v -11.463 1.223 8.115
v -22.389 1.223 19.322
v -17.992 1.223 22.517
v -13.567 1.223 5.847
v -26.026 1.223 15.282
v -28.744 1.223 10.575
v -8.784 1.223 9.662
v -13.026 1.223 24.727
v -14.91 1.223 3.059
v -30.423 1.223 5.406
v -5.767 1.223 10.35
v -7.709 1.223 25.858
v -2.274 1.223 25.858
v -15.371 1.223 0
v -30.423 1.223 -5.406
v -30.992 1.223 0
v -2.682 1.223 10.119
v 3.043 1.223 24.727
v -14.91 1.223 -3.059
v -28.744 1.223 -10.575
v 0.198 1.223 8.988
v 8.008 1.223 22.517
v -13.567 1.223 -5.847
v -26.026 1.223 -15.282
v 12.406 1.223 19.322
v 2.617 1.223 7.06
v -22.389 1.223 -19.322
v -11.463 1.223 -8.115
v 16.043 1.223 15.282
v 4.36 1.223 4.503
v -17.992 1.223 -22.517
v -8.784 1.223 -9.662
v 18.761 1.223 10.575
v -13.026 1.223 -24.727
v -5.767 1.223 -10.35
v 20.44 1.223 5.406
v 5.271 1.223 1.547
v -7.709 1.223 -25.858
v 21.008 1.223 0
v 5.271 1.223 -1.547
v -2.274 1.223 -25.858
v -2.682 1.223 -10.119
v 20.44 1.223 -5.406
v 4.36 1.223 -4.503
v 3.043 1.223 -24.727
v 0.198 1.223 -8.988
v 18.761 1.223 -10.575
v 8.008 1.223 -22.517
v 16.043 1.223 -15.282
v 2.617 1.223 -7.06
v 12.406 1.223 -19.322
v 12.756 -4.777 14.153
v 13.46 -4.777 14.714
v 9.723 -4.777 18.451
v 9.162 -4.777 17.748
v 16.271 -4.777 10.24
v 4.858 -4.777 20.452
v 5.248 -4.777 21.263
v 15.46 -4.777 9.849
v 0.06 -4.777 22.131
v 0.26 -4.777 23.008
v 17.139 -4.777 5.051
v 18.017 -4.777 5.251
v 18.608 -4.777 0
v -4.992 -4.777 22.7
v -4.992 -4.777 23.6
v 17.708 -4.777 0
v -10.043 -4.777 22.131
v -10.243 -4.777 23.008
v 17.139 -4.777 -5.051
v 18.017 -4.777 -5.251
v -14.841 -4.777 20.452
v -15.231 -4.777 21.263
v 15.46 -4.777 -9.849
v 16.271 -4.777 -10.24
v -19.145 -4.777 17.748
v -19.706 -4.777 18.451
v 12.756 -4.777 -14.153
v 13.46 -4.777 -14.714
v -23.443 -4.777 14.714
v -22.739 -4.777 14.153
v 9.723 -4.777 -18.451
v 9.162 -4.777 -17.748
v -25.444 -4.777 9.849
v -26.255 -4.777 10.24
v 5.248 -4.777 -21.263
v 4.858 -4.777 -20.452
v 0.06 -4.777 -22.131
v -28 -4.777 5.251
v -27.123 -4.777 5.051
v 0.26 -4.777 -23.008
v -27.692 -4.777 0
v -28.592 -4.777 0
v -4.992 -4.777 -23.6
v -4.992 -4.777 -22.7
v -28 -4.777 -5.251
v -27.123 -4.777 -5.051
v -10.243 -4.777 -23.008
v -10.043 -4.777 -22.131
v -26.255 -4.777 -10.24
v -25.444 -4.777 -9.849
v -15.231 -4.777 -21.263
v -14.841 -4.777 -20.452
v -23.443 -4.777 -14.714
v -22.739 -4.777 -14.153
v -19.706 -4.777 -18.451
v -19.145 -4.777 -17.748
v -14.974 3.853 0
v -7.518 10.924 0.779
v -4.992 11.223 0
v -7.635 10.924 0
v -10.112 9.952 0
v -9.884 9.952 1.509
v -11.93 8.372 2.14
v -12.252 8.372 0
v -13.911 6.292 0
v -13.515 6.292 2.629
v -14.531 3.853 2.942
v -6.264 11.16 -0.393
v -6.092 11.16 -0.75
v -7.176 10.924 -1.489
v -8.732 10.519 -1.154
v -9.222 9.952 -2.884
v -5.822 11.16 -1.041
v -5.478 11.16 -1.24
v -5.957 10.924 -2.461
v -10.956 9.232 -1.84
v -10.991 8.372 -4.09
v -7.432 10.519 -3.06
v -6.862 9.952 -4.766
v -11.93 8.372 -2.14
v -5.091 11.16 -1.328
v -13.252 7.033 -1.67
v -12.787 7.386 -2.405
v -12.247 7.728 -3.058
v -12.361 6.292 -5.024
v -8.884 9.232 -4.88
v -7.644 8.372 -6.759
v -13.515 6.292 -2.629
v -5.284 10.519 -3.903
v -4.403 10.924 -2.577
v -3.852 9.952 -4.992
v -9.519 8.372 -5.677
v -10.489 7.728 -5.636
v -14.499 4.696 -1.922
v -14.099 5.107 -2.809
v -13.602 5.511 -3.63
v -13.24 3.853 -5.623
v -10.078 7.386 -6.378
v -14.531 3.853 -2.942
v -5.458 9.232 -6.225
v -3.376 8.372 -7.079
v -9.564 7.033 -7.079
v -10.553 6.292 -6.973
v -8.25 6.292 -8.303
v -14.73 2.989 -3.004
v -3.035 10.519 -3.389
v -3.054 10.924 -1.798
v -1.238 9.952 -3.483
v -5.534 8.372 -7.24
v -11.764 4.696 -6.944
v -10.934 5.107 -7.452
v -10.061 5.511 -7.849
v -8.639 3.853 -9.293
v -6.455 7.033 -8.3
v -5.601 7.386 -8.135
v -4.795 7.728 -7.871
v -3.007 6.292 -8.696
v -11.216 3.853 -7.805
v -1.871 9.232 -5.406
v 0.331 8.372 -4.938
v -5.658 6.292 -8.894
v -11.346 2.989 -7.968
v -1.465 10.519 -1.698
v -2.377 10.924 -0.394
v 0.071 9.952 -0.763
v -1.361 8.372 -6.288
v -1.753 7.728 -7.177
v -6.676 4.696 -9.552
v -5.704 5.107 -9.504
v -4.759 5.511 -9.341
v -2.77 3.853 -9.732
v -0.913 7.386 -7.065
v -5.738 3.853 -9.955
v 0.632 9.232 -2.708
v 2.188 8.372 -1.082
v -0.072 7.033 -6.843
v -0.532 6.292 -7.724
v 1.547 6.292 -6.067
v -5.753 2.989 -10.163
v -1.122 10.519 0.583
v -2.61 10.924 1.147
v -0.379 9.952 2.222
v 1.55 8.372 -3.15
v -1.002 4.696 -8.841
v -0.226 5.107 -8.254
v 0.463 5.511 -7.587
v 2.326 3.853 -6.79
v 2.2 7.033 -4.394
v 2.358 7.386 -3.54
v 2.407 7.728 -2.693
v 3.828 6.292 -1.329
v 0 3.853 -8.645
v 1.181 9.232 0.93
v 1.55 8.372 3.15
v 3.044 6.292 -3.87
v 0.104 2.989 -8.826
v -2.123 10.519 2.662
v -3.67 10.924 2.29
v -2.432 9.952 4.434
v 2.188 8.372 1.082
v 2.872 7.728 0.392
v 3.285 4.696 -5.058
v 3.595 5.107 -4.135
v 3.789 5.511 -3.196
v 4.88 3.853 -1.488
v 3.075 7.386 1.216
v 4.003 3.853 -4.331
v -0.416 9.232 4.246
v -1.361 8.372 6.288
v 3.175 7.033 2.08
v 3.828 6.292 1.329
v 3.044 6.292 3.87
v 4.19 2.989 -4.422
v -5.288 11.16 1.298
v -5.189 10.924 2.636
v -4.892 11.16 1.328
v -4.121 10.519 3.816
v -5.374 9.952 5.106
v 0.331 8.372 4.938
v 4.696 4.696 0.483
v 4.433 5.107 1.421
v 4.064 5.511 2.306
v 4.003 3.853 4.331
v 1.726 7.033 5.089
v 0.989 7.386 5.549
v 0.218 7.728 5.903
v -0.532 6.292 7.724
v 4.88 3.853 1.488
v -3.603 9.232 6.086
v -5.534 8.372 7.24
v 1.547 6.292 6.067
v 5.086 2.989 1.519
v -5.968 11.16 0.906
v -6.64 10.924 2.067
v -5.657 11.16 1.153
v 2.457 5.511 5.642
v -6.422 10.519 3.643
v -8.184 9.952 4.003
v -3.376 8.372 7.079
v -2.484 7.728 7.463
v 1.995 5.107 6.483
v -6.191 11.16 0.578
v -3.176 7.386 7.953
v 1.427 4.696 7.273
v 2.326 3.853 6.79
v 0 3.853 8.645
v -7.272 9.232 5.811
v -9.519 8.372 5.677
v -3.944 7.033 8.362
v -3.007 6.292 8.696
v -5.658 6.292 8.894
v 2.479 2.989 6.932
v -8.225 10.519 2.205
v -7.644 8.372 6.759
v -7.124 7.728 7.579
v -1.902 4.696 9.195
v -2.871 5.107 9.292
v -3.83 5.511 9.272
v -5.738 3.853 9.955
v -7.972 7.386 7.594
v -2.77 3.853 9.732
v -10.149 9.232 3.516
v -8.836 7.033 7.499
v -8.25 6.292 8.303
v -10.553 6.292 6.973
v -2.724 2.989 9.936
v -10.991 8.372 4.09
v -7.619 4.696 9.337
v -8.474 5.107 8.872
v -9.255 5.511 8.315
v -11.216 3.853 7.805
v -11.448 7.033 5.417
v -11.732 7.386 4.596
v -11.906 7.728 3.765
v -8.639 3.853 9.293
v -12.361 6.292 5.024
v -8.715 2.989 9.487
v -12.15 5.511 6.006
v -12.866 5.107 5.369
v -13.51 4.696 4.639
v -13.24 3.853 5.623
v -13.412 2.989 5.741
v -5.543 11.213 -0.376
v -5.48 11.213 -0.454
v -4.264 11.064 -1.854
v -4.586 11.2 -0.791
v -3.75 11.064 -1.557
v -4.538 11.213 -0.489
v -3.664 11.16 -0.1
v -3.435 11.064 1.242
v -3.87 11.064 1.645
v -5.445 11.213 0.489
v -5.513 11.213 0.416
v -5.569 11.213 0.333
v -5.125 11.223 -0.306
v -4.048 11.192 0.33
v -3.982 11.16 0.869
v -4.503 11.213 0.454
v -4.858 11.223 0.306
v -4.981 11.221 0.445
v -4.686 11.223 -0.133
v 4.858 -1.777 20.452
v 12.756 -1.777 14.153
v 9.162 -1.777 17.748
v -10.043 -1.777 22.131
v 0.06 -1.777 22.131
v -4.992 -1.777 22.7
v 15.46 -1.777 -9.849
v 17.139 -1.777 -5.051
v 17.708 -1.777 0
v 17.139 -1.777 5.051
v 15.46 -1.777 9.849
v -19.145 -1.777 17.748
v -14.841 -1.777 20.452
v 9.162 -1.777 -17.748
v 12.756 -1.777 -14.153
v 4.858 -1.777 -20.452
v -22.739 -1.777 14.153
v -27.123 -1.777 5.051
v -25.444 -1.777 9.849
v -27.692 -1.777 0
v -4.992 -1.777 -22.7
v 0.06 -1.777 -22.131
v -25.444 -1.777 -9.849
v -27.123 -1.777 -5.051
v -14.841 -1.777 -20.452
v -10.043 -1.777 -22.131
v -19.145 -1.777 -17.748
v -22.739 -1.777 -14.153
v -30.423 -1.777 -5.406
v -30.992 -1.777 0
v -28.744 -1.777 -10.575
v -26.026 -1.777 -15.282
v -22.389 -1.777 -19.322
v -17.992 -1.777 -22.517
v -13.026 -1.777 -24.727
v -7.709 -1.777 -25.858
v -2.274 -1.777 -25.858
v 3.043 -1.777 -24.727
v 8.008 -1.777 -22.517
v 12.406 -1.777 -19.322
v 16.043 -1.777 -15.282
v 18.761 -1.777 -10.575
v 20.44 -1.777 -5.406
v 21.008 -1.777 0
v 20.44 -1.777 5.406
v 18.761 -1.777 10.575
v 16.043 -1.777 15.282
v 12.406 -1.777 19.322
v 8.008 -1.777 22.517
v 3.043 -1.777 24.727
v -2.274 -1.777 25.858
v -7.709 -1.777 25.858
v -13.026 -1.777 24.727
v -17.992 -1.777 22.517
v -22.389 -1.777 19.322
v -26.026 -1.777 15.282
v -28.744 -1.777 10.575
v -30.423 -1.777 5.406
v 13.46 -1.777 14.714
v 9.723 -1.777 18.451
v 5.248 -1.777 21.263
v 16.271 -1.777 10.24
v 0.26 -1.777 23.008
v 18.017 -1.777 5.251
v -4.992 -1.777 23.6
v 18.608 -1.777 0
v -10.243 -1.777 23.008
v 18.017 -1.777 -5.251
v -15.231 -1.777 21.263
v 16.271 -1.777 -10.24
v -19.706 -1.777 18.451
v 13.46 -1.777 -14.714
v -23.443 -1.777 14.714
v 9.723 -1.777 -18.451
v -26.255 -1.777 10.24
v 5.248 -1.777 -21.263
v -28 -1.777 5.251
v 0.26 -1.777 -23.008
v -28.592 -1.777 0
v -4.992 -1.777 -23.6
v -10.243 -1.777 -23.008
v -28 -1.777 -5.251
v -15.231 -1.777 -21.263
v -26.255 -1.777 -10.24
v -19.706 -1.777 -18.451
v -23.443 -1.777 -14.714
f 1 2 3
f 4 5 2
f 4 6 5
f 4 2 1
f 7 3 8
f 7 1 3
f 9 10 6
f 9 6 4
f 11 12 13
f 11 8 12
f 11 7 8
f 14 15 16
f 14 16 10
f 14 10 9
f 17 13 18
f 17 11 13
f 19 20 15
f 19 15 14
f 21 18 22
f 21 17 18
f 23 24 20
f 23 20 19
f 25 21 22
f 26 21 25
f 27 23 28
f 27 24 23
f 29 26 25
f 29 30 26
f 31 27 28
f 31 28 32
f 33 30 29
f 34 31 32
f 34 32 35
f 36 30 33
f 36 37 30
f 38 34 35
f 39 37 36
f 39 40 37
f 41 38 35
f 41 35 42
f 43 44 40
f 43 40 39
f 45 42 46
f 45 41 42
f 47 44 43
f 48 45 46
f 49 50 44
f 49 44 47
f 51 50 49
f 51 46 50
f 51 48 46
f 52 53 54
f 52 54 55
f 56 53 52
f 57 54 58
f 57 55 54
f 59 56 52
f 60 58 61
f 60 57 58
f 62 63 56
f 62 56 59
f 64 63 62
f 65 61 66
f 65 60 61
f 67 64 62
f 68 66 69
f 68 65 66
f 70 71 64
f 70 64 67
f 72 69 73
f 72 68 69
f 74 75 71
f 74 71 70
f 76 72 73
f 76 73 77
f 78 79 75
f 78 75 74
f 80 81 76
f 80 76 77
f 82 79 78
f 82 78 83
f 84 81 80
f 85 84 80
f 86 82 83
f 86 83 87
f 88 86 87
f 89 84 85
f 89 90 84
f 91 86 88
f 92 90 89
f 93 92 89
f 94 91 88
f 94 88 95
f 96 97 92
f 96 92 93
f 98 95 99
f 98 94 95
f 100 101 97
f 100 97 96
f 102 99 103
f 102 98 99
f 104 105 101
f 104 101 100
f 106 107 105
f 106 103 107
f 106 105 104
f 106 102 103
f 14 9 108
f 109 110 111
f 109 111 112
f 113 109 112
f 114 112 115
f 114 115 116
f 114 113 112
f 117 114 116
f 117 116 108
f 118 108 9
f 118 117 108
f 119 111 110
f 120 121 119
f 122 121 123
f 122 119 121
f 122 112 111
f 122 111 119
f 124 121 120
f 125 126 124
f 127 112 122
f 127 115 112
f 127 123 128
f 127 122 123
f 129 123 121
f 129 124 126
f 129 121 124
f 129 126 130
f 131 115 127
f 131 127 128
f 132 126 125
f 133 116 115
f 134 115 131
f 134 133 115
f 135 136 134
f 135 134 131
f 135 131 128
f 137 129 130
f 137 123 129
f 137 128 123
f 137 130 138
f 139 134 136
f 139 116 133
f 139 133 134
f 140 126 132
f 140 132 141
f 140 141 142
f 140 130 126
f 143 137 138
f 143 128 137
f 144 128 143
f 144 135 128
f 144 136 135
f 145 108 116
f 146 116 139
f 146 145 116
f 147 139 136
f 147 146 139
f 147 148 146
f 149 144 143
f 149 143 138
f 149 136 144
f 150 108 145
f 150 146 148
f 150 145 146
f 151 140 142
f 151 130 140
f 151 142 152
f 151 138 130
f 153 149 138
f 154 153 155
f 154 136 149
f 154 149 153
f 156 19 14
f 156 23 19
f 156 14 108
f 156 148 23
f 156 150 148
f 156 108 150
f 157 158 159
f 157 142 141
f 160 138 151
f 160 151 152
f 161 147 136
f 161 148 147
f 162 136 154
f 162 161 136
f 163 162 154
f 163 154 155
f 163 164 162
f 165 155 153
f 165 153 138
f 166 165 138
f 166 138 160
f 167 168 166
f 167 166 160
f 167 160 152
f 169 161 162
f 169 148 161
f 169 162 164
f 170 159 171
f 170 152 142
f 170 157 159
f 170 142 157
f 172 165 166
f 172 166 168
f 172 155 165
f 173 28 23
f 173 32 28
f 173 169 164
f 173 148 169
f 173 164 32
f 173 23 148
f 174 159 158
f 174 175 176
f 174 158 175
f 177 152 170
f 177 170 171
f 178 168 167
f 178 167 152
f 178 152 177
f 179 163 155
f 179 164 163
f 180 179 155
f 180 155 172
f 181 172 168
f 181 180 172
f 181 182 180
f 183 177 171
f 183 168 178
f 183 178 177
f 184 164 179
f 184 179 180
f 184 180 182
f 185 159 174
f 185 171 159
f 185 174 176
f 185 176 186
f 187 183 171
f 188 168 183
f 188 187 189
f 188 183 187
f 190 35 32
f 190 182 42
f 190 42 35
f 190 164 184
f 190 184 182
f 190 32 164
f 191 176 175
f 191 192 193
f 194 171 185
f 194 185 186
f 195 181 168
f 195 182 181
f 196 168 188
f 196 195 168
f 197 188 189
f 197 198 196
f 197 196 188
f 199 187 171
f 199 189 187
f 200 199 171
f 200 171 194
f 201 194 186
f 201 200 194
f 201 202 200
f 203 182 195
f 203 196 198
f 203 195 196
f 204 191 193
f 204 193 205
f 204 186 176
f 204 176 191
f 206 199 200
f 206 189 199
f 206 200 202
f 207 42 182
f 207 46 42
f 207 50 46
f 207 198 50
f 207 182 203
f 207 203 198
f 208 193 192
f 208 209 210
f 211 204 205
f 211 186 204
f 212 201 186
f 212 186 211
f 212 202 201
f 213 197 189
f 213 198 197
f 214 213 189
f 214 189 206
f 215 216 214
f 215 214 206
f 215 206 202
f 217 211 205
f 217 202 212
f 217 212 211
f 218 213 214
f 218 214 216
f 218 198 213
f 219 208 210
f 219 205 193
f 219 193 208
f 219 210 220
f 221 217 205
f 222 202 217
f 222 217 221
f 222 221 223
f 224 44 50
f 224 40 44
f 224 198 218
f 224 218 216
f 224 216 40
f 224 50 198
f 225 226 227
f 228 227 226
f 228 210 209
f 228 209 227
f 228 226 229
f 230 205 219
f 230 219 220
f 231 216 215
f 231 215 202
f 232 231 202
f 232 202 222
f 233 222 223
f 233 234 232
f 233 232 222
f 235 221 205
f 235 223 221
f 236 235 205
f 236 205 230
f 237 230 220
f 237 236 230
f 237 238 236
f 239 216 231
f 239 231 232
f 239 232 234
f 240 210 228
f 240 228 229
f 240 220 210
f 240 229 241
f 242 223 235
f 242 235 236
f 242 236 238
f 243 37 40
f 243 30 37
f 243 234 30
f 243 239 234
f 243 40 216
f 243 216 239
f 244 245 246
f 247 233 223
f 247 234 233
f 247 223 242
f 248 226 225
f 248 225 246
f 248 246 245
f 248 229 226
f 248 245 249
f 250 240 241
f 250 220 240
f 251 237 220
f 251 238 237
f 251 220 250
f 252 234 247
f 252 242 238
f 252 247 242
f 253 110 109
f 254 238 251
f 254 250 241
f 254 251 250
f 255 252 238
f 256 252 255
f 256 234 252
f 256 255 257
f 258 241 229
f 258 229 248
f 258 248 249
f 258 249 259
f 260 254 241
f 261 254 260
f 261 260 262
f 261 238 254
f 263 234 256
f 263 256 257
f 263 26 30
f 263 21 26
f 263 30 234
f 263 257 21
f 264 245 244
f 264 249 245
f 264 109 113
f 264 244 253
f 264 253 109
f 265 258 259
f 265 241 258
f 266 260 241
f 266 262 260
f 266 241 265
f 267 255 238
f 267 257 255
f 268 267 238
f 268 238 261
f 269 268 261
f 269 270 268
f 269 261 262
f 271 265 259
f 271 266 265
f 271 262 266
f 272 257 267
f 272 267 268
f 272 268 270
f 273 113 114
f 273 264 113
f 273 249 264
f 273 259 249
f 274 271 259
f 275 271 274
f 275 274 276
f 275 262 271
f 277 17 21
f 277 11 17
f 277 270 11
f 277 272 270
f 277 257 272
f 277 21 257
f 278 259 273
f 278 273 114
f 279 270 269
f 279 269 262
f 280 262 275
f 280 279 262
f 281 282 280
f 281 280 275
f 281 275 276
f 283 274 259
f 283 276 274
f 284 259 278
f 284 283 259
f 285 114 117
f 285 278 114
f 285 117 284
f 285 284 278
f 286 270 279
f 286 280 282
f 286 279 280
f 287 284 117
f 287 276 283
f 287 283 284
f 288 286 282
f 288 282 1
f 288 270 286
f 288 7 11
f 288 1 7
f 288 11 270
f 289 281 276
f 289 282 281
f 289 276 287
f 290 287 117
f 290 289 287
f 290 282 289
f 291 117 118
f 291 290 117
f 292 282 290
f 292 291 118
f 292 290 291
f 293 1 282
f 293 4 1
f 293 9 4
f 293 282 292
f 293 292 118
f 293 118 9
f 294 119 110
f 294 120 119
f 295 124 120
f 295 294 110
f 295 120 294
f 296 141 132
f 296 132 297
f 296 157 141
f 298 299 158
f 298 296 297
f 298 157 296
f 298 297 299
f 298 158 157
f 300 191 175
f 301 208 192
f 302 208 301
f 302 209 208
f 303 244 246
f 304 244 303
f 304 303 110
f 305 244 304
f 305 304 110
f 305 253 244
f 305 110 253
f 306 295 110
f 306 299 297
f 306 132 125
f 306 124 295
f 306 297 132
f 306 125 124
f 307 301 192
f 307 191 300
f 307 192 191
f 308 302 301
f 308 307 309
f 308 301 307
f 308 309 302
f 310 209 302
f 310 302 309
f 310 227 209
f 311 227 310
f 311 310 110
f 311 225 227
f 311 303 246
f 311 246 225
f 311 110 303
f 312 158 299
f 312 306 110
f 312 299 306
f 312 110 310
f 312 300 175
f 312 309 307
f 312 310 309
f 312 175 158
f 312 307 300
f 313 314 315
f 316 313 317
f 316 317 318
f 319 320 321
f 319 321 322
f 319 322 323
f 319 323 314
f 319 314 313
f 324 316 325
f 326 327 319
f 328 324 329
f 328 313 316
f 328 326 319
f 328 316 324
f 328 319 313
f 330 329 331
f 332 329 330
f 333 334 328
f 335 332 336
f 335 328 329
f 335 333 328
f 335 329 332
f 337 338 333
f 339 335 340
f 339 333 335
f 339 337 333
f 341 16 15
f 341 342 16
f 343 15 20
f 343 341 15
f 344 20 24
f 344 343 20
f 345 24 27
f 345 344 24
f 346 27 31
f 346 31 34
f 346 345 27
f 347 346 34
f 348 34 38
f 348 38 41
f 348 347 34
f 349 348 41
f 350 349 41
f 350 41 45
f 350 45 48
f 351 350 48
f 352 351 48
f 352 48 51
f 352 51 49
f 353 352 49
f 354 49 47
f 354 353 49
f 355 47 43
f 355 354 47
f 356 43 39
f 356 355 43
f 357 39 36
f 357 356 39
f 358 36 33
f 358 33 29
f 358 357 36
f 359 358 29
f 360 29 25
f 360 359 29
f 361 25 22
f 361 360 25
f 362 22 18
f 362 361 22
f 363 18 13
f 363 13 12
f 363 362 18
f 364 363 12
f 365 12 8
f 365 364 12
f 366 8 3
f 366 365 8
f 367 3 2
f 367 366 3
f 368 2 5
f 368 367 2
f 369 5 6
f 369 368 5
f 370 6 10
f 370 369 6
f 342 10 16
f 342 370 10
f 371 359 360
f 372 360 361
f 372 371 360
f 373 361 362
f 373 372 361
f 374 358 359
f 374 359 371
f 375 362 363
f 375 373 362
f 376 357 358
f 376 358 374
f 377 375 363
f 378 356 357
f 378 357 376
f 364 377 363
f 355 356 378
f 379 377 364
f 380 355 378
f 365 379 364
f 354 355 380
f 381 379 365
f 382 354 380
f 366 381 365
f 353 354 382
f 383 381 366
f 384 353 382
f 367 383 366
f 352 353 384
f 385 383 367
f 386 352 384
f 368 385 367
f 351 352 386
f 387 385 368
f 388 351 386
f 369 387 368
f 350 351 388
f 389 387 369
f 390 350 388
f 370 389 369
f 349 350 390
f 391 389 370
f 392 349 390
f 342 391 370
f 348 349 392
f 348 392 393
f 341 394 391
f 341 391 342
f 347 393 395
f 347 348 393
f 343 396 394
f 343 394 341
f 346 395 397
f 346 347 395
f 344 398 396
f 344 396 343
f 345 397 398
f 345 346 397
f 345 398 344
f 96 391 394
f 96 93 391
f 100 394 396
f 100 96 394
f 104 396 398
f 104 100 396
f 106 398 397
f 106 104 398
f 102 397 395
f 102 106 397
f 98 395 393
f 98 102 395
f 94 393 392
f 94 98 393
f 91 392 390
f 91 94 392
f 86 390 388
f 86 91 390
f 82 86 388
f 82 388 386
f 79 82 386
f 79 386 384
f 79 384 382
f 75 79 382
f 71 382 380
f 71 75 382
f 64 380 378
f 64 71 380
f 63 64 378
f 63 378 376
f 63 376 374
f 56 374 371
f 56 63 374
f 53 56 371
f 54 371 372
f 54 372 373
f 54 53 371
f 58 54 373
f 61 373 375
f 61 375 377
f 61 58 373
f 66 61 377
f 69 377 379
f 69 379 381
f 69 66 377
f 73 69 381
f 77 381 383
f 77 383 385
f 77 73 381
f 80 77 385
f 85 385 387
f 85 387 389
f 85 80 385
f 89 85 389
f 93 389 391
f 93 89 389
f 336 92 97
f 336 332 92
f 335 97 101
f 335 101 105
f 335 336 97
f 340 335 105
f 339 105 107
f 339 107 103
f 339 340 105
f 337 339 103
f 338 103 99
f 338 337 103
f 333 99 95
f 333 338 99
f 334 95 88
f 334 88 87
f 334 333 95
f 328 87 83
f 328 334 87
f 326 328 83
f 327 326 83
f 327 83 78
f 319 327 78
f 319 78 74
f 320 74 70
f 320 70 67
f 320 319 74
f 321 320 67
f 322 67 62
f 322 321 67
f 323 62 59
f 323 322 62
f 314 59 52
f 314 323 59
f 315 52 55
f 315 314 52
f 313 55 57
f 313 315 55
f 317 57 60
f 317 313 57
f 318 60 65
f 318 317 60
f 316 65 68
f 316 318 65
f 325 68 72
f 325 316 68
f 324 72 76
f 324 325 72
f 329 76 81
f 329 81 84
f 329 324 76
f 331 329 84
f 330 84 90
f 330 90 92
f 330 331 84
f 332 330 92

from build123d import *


with BuildPart() as part:
    # Croquis1 → Revolución1 (revolve)
    with BuildSketch(Plane.XY):
        with BuildLine():
            Line((-27.691646337, -4.777448071), (-27.691646337, -1.777448071))
            Line((-27.691646337, -1.777448071), (-4.991646337, -1.777448071))
            Line((-4.991646337, -1.777448071), (-4.991646337, 11.222551929))
            ThreePointArc((-4.991646337, 11.222551929), (-12.252224974, 8.372117695), (-15.370667987, 1.222551929))
            Line((-15.370667987, 1.222551929), (-30.991646337, 1.222551929))
            Line((-30.991646337, 1.222551929), (-30.991646337, -1.777448071))
            Line((-30.991646337, -1.777448071), (-28.591646337, -1.777448071))
            Line((-28.591646337, -1.777448071), (-28.591646337, -4.777448071))
            Line((-28.591646337, -4.777448071), (-27.691646337, -4.777448071))
        make_face()
    revolve(axis=Axis((-4.991646337, 5.975396892, 0), (0, -1, 0)))


solid = part.part
